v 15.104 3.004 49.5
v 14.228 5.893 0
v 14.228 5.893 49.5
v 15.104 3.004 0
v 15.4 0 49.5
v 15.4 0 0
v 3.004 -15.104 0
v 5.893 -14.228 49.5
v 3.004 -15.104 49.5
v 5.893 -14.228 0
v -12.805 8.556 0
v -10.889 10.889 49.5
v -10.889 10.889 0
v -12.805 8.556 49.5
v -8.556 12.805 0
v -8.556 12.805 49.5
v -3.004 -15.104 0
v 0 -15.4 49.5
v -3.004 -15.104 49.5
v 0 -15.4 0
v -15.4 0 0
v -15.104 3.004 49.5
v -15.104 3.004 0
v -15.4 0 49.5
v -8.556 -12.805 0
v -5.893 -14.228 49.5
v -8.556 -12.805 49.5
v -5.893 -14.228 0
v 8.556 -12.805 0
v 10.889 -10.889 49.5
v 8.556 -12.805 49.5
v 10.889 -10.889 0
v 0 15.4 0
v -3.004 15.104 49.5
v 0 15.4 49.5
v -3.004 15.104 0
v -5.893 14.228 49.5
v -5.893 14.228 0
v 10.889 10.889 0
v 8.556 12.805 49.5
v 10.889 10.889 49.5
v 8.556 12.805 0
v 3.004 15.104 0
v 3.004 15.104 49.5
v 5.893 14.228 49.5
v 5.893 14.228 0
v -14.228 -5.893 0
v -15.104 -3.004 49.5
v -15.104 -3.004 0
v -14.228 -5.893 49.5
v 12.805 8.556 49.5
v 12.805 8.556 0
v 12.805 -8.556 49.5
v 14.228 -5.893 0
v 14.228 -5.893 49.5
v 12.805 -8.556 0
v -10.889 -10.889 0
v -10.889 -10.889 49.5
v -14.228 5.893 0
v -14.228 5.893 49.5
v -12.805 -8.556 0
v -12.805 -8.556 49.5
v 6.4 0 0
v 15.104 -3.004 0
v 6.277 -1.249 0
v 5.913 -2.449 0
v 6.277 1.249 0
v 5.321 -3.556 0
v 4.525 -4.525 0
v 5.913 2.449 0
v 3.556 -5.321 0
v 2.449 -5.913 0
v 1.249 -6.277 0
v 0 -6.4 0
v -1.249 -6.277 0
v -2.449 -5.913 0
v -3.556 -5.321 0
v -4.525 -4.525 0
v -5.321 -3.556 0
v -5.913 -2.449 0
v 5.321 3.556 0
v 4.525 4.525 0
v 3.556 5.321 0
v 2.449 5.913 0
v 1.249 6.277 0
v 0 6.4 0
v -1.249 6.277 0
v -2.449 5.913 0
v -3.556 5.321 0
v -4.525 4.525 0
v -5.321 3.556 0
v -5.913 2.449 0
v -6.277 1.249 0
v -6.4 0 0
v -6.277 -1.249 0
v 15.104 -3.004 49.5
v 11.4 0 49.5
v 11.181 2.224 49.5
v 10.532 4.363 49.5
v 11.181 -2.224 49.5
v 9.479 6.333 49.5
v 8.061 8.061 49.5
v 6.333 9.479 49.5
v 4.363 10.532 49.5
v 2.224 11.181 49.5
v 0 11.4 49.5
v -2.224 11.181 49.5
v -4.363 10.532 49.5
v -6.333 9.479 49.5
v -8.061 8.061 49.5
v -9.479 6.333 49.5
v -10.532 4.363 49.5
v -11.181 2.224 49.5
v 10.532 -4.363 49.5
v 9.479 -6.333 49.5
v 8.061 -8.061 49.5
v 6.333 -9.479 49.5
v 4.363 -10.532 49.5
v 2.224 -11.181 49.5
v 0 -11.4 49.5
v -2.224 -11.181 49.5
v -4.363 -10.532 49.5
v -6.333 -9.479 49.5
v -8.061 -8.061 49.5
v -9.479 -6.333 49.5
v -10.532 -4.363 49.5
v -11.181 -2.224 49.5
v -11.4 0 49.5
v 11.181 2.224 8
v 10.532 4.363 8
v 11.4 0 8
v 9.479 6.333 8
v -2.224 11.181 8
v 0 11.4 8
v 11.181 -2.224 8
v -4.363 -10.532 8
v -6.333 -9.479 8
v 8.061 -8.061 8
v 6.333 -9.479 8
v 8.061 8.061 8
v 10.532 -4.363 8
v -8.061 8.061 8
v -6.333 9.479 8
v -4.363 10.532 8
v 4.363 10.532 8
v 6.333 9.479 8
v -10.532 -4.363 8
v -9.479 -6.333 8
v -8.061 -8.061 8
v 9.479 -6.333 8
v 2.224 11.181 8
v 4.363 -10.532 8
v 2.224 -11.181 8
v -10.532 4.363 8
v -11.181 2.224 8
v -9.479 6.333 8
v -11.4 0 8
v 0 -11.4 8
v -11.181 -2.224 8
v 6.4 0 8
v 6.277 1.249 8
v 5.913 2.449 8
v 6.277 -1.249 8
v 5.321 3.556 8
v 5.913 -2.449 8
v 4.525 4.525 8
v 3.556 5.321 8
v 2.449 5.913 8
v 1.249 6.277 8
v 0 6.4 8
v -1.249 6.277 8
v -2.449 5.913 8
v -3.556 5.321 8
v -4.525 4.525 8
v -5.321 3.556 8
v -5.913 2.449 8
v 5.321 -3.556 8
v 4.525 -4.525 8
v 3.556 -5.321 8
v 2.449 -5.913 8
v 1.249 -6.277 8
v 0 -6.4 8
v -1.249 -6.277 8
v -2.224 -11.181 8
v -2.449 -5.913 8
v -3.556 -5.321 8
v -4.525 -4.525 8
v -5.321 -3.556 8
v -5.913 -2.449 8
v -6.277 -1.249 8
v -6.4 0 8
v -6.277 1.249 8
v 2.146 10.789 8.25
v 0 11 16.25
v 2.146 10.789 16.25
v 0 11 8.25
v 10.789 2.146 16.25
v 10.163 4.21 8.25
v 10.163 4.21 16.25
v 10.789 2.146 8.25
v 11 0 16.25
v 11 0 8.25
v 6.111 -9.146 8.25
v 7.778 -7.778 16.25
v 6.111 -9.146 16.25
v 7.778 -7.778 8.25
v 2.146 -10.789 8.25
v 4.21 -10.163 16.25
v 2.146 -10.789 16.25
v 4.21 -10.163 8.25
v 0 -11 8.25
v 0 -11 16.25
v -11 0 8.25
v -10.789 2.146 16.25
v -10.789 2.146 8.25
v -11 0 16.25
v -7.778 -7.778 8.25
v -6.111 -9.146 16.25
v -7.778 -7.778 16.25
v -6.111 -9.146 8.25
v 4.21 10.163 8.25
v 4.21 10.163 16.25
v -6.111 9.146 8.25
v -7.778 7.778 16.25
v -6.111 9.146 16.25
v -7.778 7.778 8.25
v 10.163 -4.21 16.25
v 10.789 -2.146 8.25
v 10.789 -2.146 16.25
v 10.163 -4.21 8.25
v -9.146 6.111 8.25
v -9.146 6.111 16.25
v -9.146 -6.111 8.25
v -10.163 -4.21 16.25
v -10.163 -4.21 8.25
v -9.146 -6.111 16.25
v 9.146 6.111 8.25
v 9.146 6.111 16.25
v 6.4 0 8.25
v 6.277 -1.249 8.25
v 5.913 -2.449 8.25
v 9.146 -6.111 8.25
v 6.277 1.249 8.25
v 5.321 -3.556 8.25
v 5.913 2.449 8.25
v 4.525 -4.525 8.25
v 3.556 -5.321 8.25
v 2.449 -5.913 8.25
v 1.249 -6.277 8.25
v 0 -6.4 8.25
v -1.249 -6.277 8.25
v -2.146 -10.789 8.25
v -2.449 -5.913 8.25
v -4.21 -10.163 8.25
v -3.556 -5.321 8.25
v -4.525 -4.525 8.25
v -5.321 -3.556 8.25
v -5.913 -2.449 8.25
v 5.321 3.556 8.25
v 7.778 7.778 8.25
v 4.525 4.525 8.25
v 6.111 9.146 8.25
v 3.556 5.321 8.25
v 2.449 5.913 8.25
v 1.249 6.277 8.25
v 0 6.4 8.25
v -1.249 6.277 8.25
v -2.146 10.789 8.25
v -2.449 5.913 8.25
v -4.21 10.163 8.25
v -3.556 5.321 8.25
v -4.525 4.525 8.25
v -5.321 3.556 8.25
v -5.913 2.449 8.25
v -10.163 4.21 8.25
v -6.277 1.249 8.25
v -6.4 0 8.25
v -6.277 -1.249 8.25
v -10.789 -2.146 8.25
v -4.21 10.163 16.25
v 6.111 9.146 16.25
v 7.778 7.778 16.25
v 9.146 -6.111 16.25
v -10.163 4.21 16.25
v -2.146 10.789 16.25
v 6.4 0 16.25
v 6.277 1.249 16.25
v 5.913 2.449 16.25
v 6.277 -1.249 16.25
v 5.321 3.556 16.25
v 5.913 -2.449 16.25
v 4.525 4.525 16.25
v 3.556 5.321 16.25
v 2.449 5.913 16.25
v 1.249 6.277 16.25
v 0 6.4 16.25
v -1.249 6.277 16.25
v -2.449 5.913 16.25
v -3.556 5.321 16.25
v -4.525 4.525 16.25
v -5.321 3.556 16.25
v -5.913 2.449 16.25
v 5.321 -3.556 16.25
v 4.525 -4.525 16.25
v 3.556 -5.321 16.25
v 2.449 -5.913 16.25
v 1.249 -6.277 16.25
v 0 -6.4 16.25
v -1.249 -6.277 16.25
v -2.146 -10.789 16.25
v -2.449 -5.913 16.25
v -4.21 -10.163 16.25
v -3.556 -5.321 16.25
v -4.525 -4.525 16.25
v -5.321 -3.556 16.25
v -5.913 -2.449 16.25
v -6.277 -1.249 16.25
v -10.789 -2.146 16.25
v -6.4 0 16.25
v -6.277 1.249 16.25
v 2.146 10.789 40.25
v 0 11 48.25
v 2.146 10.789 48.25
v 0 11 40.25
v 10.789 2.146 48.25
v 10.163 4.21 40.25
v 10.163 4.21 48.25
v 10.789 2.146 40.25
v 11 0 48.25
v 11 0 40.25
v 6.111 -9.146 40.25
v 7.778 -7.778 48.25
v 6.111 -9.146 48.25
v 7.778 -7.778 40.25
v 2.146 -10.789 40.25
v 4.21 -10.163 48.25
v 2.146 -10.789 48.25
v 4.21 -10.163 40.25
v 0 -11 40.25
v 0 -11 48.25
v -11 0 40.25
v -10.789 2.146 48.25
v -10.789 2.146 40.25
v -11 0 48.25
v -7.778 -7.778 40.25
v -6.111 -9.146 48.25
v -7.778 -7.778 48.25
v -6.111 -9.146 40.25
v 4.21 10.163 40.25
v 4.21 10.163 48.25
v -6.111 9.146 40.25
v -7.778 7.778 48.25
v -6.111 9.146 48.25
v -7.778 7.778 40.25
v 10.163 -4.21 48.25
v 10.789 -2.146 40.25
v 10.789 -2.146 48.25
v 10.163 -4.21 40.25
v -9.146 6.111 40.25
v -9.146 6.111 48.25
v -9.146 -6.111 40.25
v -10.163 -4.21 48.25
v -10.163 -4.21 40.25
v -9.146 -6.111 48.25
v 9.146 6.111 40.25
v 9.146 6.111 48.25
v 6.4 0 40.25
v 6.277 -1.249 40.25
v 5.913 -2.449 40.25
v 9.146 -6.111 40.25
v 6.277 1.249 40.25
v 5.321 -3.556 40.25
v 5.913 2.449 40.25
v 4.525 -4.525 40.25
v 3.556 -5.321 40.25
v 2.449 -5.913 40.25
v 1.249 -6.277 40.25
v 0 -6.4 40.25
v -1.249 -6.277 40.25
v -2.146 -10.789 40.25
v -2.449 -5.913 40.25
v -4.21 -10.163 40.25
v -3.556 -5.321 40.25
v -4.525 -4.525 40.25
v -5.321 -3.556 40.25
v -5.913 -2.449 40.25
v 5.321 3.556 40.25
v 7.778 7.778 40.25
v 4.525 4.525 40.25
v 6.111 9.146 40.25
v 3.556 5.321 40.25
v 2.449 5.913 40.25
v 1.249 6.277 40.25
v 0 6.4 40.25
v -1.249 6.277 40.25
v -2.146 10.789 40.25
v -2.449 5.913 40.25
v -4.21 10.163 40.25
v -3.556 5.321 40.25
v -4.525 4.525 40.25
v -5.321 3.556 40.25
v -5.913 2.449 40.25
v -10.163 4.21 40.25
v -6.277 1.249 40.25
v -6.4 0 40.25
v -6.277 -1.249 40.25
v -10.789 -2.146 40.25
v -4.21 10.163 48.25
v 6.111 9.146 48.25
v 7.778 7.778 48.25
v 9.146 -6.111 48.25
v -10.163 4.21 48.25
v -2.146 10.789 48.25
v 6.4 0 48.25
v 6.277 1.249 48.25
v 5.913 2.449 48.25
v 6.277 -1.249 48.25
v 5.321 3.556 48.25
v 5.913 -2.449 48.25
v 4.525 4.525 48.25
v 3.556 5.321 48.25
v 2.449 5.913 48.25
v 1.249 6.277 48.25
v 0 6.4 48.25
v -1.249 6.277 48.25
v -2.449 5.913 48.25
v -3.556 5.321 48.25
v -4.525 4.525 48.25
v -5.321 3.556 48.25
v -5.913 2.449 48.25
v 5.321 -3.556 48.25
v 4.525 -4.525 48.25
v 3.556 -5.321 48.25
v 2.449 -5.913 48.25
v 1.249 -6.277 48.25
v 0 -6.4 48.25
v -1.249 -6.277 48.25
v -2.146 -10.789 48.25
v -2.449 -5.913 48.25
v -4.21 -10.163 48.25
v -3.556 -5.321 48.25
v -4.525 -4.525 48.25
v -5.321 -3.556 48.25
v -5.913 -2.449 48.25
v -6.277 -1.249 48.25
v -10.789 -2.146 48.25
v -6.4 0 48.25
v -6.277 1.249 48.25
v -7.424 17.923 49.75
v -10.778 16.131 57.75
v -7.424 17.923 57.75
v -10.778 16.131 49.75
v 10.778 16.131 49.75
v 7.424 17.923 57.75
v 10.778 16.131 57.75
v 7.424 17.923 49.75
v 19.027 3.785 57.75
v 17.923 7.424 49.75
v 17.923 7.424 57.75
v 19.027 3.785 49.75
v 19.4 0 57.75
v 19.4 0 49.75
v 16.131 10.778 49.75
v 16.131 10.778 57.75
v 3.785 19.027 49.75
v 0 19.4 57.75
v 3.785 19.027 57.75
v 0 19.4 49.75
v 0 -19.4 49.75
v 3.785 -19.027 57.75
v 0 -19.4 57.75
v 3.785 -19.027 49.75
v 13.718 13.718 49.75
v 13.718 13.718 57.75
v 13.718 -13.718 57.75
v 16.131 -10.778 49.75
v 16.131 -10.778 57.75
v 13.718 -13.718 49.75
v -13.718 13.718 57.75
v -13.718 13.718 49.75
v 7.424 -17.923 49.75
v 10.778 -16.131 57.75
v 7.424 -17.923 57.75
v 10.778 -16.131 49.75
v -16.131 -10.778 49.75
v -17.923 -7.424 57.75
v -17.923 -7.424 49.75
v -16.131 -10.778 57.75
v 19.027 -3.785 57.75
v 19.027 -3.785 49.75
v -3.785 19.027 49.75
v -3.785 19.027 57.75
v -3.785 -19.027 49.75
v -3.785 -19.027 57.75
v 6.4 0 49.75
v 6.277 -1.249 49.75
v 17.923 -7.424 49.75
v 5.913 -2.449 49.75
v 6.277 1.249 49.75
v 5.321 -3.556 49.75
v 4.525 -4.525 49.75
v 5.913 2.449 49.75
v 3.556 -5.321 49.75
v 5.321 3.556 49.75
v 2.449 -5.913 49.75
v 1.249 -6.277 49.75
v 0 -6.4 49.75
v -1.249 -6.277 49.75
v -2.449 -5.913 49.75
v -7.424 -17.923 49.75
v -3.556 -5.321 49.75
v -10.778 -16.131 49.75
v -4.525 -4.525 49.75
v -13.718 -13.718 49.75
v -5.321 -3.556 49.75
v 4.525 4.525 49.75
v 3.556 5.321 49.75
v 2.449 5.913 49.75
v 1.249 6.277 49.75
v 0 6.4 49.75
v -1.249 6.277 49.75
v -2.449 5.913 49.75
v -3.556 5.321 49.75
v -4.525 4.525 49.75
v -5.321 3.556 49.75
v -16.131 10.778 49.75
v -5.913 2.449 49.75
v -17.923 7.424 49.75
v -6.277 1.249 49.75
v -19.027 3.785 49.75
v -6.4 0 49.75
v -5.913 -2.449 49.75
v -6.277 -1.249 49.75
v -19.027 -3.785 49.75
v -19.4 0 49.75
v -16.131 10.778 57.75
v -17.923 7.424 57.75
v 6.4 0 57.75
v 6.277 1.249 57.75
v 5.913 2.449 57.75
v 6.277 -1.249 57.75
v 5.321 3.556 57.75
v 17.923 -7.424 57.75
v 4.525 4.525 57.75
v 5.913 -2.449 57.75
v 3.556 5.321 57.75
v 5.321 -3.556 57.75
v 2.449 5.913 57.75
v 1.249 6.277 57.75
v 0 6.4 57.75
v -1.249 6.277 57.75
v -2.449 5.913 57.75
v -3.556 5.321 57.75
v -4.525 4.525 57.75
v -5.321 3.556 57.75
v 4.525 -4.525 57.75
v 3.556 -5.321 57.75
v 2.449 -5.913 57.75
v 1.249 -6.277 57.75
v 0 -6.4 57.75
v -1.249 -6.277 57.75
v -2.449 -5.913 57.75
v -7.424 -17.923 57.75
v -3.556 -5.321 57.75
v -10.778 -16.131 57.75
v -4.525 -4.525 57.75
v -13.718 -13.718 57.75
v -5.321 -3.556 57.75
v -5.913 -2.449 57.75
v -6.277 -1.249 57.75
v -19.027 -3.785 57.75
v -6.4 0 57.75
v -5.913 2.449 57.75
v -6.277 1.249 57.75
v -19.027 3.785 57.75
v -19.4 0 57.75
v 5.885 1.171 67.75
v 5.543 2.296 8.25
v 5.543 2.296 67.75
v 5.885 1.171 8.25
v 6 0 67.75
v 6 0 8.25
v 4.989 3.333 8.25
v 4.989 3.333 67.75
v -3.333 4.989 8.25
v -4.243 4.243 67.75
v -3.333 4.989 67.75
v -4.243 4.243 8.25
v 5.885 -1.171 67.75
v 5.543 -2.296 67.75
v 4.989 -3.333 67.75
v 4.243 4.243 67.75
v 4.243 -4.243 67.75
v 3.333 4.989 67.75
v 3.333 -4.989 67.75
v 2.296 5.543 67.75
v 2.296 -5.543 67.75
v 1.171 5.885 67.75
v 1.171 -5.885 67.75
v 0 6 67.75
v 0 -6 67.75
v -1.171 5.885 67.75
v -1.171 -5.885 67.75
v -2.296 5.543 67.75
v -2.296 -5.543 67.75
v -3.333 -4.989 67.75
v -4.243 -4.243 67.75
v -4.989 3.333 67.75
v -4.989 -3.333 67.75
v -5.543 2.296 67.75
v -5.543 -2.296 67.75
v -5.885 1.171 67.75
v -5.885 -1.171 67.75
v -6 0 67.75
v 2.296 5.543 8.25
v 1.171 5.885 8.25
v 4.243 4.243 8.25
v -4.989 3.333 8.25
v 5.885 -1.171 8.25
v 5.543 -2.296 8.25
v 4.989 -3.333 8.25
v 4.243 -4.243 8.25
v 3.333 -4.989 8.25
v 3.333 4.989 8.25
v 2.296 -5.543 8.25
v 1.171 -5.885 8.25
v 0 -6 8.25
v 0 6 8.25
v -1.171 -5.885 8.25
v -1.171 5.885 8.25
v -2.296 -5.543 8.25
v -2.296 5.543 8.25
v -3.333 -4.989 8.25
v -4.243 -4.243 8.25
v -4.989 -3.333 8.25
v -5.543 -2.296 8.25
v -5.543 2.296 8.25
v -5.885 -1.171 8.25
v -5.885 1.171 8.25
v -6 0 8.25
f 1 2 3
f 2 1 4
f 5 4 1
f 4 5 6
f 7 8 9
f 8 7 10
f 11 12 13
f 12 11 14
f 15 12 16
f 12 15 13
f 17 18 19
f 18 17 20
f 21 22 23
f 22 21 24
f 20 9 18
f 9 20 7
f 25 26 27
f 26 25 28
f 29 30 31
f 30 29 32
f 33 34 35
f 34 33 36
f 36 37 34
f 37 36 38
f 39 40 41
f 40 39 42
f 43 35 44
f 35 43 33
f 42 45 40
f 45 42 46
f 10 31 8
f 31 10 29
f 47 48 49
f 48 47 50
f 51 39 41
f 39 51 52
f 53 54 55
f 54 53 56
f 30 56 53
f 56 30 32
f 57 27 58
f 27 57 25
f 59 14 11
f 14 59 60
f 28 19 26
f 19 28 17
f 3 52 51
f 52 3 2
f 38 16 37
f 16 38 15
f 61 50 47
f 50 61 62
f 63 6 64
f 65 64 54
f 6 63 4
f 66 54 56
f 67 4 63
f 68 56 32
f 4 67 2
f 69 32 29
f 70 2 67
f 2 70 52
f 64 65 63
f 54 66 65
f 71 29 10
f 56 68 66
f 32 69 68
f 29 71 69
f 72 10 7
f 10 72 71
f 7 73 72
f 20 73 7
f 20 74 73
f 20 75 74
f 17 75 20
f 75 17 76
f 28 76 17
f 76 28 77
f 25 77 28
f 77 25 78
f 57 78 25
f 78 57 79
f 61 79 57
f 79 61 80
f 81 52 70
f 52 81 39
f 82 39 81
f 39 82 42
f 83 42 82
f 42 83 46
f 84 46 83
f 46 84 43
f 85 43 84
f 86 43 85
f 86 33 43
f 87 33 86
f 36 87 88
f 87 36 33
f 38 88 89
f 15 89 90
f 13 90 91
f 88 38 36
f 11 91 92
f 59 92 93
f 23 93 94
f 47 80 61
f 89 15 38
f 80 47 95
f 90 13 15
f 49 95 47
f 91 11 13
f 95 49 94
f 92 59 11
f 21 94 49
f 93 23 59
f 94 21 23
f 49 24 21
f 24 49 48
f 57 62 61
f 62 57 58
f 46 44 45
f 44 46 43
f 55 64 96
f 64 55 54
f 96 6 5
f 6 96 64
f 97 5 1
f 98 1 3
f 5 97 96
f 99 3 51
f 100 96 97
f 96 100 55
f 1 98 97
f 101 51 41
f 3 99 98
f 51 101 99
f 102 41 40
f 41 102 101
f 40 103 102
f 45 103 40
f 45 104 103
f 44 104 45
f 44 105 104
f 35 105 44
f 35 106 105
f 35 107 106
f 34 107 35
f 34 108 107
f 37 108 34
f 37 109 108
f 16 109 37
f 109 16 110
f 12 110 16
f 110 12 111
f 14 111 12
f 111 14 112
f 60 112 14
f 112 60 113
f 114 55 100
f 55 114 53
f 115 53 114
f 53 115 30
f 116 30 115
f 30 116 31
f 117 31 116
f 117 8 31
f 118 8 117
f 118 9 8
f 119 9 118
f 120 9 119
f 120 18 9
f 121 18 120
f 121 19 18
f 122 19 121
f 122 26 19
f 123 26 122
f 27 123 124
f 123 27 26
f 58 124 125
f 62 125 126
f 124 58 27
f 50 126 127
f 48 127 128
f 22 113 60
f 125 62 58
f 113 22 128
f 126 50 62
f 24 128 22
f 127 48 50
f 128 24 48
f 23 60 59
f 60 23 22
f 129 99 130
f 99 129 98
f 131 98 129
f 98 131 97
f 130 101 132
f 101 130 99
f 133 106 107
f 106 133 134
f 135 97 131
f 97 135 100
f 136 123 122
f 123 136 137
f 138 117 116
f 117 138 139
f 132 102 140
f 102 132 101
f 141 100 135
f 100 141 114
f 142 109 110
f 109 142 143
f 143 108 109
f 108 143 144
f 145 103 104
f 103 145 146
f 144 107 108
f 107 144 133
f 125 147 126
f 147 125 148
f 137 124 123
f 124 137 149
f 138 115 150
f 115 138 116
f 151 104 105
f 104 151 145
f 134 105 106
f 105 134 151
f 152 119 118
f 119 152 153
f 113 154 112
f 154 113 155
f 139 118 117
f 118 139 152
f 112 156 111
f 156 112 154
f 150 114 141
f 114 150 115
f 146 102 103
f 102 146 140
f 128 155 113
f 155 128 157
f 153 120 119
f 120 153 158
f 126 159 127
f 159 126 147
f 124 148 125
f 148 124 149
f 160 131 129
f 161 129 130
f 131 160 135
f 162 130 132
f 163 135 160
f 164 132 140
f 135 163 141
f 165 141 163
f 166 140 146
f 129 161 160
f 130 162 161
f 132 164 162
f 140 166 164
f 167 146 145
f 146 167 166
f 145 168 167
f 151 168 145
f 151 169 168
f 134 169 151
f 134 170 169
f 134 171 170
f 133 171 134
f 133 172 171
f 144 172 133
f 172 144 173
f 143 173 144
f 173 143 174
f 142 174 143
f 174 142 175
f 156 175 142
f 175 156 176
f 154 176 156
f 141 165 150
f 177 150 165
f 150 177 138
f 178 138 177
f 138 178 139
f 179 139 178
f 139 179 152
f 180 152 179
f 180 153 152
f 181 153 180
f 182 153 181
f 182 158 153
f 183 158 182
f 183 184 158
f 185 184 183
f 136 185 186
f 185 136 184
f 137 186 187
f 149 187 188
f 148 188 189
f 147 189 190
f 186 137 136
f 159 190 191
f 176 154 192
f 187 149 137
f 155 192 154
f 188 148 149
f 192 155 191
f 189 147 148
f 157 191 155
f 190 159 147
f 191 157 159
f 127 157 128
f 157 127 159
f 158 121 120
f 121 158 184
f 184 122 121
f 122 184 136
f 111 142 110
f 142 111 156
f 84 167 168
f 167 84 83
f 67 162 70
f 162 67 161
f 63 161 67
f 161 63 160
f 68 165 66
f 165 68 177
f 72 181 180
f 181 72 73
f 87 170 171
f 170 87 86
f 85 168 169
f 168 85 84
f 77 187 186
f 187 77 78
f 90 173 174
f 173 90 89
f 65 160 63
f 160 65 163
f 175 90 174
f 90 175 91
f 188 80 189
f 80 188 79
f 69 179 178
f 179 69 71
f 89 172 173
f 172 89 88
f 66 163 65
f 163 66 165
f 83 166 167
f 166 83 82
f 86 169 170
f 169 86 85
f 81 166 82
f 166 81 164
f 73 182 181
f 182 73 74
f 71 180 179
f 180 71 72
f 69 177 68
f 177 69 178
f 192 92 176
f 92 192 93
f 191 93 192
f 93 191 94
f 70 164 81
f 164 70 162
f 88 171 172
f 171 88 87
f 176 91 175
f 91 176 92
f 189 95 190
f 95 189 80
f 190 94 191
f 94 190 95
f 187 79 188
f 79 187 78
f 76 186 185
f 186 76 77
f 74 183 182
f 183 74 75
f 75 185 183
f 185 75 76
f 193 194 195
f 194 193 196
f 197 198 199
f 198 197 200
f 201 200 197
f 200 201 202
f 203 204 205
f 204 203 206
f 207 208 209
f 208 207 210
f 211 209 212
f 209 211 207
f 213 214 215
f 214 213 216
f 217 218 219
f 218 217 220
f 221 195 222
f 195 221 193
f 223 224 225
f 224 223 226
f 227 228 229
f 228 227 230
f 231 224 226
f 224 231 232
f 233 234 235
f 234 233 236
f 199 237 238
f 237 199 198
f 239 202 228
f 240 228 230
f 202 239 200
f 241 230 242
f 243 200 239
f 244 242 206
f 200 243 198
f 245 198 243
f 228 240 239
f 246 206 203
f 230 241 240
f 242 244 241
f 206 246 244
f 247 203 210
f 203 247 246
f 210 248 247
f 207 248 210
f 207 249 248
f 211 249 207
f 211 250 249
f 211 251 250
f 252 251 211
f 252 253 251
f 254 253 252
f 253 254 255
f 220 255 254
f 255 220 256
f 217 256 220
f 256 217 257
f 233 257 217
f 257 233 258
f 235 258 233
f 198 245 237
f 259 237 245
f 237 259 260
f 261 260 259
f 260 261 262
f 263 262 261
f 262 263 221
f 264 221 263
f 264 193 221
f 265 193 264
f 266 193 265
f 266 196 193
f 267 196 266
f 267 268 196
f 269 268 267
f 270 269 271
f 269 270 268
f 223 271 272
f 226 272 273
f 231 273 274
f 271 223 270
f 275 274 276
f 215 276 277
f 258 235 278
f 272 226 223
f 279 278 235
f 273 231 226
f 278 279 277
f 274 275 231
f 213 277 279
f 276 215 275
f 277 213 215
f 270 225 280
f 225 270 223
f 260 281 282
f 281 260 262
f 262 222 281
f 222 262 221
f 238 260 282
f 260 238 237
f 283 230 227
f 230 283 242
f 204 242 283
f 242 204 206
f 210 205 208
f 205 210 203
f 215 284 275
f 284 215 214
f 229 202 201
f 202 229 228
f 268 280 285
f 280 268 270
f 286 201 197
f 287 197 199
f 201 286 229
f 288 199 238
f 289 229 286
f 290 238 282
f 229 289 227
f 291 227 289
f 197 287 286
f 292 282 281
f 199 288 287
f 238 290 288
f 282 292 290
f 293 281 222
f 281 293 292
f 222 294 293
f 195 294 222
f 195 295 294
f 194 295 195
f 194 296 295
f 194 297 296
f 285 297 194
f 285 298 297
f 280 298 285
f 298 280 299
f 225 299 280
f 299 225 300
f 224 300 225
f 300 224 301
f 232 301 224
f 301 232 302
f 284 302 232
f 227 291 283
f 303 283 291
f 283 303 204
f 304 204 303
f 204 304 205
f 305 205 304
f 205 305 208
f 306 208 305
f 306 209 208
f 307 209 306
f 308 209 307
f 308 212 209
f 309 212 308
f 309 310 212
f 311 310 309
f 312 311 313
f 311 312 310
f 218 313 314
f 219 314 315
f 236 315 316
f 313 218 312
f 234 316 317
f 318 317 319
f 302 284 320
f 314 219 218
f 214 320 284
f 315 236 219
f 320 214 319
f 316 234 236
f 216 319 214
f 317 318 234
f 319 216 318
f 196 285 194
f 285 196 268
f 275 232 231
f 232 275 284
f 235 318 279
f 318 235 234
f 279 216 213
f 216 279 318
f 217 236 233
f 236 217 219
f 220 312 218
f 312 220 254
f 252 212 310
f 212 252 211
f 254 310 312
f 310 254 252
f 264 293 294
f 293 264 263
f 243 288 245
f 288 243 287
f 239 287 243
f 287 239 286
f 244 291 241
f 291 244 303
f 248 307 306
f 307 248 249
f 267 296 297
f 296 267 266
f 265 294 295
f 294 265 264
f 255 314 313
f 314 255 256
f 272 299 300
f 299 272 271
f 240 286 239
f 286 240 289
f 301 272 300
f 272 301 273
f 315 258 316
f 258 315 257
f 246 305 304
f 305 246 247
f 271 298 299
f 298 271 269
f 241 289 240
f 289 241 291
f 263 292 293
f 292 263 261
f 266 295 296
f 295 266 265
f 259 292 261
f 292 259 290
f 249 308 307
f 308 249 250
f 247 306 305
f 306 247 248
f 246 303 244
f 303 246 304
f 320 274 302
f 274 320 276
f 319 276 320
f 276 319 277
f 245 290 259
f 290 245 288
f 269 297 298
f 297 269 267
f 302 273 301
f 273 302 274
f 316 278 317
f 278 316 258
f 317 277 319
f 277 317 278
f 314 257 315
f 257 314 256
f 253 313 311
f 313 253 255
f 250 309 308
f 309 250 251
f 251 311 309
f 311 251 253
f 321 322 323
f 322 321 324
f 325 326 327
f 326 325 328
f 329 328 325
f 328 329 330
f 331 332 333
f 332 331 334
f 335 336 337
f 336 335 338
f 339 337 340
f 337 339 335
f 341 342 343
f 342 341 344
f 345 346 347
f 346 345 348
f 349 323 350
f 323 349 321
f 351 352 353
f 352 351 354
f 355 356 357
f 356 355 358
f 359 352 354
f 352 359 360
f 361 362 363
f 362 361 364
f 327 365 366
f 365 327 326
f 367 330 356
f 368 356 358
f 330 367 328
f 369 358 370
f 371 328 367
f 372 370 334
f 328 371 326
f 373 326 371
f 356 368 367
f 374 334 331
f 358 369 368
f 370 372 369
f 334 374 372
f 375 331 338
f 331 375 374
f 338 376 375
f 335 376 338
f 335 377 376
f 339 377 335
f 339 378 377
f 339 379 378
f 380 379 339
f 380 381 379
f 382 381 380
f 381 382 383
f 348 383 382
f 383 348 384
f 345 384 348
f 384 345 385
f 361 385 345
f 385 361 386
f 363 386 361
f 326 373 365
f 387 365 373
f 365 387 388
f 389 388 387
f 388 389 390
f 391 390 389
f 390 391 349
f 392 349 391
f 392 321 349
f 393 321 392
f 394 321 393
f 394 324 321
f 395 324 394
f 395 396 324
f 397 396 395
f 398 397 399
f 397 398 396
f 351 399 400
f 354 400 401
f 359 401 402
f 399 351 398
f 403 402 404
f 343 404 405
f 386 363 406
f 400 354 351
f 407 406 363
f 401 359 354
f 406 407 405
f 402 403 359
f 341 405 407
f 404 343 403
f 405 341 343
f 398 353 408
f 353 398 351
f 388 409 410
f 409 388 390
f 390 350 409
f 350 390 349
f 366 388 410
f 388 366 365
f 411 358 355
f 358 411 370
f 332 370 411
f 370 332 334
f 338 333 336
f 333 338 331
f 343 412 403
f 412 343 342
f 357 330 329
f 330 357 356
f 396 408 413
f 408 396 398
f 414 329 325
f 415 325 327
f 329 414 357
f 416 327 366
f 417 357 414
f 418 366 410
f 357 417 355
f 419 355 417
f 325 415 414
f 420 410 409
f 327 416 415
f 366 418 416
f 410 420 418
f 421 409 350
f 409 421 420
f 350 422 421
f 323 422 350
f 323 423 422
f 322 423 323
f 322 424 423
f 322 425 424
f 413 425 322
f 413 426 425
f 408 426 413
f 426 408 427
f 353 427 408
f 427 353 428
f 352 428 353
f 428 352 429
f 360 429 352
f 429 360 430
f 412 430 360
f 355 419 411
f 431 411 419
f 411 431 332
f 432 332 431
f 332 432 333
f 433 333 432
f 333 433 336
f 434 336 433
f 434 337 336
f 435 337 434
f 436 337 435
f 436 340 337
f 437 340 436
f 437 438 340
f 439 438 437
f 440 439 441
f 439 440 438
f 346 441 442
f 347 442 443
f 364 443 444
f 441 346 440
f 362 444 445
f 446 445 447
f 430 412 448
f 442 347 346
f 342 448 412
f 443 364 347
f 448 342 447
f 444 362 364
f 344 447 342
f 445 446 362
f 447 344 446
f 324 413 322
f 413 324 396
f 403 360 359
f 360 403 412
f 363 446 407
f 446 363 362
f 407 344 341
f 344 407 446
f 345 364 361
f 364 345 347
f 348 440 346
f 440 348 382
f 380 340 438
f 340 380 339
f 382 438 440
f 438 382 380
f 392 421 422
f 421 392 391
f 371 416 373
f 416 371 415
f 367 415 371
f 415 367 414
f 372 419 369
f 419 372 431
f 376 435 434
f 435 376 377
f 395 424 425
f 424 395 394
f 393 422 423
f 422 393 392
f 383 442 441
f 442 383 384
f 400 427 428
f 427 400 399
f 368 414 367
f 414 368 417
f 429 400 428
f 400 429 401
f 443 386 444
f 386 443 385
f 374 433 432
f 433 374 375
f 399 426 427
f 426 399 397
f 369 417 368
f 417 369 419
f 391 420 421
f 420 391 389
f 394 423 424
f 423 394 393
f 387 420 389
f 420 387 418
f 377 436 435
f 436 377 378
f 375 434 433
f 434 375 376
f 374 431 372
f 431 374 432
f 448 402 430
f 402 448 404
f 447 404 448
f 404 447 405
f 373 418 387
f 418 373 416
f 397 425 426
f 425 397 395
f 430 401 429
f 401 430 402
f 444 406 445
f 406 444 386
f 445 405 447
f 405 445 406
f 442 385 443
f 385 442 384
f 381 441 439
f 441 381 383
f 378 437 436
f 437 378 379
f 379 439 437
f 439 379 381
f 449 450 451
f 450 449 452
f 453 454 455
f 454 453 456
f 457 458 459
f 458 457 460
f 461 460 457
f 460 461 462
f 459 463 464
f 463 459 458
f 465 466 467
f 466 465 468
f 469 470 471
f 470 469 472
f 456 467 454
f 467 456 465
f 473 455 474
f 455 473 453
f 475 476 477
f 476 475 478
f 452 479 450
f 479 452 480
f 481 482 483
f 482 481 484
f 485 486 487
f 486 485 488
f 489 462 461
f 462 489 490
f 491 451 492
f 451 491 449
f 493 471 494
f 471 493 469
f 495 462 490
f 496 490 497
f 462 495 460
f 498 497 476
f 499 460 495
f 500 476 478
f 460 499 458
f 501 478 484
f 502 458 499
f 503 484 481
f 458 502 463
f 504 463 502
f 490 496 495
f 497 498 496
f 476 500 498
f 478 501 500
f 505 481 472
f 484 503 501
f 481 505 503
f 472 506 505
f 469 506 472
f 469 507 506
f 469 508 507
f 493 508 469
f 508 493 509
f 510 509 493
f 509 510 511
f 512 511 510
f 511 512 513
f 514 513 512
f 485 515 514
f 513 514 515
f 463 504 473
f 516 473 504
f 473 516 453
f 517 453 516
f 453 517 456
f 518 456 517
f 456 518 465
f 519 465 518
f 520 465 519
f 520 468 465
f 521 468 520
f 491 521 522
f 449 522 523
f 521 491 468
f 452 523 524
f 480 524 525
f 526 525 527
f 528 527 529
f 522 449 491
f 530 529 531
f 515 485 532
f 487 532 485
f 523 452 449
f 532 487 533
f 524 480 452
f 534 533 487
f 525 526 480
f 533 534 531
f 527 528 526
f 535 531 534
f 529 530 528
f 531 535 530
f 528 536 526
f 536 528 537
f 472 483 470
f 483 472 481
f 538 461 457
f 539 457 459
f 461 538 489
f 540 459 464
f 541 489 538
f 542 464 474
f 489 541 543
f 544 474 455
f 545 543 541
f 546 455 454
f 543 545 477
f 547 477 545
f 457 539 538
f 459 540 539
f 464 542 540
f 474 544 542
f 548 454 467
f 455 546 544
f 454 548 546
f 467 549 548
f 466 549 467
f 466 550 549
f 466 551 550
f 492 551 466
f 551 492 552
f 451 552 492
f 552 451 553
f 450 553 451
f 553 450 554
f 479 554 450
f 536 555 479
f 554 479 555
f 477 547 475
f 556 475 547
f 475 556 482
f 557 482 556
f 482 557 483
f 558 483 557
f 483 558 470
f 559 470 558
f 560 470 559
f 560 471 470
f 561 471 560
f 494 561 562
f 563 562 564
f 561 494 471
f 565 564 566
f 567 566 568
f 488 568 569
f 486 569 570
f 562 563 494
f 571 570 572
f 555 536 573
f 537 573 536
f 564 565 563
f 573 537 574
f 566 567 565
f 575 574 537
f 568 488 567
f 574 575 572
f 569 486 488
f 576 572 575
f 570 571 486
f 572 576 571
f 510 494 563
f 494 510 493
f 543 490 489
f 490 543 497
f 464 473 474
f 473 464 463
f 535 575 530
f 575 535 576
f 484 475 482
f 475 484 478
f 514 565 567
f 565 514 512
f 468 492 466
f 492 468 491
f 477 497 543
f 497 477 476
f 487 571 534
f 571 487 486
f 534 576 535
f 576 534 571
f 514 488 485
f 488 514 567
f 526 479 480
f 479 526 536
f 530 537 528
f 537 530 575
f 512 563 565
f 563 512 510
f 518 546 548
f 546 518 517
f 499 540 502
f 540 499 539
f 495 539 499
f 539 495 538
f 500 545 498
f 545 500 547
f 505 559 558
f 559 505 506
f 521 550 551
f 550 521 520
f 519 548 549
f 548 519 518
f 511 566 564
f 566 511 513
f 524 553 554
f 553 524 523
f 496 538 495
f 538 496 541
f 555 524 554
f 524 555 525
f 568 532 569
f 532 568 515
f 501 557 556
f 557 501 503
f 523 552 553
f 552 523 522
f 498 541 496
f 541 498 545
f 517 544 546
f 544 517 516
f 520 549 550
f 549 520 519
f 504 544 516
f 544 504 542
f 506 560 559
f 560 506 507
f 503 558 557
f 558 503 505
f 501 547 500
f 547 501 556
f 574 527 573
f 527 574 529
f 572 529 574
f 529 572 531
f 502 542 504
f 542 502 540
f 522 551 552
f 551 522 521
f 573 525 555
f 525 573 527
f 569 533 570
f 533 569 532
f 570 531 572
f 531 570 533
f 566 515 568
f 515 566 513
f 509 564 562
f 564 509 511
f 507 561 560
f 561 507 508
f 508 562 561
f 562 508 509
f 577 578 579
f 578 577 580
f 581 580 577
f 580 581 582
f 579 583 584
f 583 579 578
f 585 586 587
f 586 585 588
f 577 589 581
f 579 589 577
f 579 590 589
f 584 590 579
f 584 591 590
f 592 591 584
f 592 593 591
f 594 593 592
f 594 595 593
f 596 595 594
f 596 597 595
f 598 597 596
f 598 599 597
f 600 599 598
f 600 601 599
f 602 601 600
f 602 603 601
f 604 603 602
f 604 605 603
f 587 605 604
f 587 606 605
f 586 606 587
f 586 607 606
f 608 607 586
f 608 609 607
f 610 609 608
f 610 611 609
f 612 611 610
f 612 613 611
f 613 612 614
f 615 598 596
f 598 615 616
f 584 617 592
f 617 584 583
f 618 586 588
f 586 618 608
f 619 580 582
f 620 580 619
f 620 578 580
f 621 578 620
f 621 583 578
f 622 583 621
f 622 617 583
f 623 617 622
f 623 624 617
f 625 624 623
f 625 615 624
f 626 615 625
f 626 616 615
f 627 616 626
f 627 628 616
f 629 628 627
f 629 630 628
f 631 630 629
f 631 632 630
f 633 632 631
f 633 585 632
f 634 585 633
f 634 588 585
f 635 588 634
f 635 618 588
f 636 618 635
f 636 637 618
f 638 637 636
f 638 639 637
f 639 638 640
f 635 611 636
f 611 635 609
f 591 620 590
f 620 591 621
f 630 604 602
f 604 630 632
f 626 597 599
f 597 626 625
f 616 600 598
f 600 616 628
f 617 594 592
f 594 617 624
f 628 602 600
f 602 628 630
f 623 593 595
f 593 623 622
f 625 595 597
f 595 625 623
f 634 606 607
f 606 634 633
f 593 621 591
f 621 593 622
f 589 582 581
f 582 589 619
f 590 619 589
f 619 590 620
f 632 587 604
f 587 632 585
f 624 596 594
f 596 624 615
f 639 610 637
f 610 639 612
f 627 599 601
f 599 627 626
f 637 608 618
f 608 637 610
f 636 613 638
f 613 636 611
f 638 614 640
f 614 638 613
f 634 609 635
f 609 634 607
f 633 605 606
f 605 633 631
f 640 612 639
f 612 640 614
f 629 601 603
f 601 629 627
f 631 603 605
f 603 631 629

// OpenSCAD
$fn = 32;

// ------------------------------------------------------------------------
// Shaft station: cup d30.8 x 49.5 mm, shaft d12
// Every part is its own module, assembly() places every instance.
// ------------------------------------------------------------------------

// --- part 1 ---
module housing_cup() {
  difference() {
    cylinder(h = 49.5, d = 30.8);
    translate([0, 0, 8]) cylinder(h = 42.5, d = 22.8);
    translate([0, 0, -1]) cylinder(h = 10, d = 12.8);
  }
}

// --- part 2 ---
module bearing_lower() {
  difference() {
      translate([0, 0, 0]) cylinder(h = 8, d = 22);
      translate([0, 0, -1]) cylinder(h = 10, d = 12.8);
    }
}

// --- part 3 ---
module bearing_upper() {
  difference() {
      translate([0, 0, 0]) cylinder(h = 8, d = 22);
      translate([0, 0, -1]) cylinder(h = 10, d = 12.8);
    }
}

// --- part 4 ---
module station_shaft() {
  translate([0, 0, -29.75]) cylinder(h = 59.5, d = 12);
}

// --- part 5 ---
module station_cover() {
  difference() {
    cylinder(h = 8, d = 38.8);
    translate([0, 0, -1]) cylinder(h = 10, d = 12.8);
  }
}

// --- assembly ---
module assembly() {
  color([0.80, 0.24, 0.20]) translate([0, 0, 0]) rotate([0, 0, 0]) housing_cup();
  color([0.20, 0.45, 0.75]) translate([0, 0, 8.25]) rotate([0, 0, 0]) bearing_lower();
  color([0.25, 0.62, 0.32]) translate([0, 0, 40.25]) rotate([0, 0, 0]) bearing_upper();
  color([0.92, 0.70, 0.18]) translate([0, 0, 38]) rotate([0, 0, 0]) station_shaft();
  color([0.58, 0.35, 0.70]) translate([0, 0, 49.75]) rotate([0, 0, 0]) station_cover();
}

assembly();
